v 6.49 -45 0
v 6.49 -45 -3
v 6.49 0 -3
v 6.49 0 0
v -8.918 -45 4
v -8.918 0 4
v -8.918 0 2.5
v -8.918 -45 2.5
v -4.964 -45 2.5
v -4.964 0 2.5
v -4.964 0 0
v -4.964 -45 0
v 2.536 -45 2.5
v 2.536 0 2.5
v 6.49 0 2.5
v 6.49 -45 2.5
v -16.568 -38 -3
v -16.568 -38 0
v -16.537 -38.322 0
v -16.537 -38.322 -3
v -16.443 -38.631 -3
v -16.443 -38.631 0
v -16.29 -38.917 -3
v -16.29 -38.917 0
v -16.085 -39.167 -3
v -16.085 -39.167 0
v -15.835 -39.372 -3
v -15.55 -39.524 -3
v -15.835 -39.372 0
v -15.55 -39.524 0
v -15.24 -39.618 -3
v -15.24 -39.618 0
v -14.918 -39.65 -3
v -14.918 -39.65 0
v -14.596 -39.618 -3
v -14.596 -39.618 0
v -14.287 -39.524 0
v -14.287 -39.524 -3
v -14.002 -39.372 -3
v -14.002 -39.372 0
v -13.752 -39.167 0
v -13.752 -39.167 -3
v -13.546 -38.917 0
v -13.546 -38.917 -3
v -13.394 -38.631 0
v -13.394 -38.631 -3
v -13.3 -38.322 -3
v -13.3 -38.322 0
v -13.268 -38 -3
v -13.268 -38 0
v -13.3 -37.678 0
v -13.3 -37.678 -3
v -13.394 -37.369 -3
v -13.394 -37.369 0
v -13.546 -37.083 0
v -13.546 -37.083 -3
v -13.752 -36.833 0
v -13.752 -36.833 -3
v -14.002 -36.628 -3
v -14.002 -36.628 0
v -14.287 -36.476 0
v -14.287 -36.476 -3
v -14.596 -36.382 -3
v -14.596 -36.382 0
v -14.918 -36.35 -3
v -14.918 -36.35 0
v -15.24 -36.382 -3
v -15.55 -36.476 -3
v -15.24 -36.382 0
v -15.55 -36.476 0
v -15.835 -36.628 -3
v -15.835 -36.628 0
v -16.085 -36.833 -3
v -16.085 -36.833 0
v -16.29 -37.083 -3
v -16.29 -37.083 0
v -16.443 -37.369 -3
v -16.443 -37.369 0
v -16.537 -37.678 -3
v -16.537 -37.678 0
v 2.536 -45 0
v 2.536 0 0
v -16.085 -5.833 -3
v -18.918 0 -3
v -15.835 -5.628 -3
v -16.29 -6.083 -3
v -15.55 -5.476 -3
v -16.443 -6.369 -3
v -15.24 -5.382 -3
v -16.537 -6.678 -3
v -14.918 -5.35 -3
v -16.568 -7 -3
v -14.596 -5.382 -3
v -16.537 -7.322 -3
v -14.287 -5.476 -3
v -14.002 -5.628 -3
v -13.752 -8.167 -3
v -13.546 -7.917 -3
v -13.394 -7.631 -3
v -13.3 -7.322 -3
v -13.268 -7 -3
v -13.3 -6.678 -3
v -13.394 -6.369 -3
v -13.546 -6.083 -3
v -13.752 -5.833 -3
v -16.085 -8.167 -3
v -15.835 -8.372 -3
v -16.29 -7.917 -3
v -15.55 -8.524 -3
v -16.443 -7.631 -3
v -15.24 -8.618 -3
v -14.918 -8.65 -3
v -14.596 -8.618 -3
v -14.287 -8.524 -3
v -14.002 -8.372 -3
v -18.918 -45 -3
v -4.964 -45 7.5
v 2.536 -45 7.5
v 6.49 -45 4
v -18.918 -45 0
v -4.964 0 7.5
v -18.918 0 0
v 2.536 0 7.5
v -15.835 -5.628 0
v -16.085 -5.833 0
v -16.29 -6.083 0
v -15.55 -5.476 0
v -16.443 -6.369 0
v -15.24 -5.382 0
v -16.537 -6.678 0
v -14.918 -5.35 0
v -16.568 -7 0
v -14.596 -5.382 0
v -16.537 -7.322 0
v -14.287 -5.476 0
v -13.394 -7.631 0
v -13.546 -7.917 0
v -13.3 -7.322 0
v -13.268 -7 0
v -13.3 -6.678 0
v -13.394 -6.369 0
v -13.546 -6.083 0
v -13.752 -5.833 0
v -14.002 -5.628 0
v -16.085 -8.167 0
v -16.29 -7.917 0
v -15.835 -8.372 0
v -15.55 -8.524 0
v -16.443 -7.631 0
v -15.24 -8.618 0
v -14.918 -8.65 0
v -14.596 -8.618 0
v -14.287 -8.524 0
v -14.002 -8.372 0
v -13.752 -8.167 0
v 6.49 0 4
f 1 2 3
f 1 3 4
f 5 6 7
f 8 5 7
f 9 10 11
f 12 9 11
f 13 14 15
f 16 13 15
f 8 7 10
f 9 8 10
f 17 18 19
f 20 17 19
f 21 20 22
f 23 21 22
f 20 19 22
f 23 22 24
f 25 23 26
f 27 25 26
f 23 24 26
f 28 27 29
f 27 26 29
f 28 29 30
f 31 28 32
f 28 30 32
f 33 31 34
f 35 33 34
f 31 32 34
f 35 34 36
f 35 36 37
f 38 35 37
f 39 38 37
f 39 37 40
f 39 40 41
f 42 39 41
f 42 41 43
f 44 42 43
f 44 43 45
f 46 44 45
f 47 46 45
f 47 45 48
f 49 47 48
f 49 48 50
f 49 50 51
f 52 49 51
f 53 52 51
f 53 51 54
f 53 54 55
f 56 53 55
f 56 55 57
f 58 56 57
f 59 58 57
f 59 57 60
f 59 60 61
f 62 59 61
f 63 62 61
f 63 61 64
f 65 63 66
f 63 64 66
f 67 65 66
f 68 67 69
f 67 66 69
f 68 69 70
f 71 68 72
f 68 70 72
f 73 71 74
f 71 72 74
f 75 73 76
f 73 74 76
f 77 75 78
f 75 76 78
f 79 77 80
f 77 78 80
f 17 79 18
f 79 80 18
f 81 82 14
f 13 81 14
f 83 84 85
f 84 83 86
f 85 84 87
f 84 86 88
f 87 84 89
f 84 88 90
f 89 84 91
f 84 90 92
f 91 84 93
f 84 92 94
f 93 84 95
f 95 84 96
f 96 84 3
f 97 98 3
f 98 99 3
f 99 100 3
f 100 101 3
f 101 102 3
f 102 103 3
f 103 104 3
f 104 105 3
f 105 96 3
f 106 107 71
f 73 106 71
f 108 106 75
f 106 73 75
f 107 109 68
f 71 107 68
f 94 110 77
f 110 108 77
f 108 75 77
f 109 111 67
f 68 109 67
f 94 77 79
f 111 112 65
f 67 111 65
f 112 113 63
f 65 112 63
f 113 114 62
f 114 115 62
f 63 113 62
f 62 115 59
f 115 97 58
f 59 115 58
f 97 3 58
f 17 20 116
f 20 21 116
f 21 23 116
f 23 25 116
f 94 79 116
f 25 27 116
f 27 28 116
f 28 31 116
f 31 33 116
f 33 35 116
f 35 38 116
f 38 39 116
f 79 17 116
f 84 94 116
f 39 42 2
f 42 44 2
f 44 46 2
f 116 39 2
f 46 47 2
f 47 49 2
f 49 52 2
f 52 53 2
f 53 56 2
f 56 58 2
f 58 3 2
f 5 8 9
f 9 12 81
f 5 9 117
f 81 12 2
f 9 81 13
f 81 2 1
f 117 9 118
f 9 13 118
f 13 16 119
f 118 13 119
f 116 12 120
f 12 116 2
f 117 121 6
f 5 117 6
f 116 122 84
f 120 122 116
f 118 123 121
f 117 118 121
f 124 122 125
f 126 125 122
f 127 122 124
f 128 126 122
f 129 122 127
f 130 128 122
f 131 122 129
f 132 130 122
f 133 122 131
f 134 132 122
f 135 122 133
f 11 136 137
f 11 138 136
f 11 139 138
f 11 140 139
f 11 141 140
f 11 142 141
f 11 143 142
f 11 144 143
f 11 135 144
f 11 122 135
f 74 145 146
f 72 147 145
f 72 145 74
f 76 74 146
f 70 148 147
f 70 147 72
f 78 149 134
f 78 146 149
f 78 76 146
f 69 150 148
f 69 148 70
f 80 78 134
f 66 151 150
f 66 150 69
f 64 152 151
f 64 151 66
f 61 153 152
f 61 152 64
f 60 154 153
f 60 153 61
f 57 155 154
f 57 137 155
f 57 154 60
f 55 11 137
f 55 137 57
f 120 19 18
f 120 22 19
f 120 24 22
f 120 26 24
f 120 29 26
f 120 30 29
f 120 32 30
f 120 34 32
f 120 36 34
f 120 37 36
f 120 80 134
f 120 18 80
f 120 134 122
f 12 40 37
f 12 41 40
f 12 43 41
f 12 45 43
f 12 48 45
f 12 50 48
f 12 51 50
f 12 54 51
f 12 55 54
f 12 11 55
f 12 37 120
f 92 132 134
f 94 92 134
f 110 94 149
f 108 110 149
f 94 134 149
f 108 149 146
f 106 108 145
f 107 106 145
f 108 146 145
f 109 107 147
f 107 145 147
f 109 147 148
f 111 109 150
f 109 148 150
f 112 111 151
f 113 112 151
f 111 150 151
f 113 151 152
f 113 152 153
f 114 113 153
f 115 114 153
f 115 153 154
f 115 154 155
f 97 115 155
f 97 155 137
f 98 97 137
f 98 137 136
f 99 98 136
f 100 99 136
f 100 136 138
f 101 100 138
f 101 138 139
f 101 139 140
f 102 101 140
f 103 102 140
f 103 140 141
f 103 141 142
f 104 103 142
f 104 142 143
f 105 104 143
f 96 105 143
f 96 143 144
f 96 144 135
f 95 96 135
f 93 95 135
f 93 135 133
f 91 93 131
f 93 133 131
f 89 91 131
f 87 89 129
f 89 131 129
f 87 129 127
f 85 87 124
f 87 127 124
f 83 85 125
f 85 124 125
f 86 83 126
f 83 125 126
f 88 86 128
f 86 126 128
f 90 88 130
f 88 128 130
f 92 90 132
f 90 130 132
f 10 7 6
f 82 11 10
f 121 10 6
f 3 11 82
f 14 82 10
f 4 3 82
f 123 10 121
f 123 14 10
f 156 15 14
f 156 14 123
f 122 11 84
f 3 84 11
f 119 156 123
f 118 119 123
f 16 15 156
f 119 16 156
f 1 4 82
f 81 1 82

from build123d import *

# Parameters (mm, degrees)
F1_DEPTH = 45
F2_W     = 45
F2_H     = 3
F3_DEPTH = 10
F5_D     = 3.3


with BuildPart() as f1:
    # F0 (on Front) → F1 (new body)
    with BuildSketch(Plane.XZ):
        Polygon((-4.964183461, 2.5), (-4.964183461, 0), (2.535816539, 0), (2.535816539, 2.5), (6.4899705969, 2.5), (6.4899705969, 4), (2.535816539, 7.5), (-4.964183461, 7.5), (-8.9183375189, 4), (-8.9183375189, 2.5), align=None)
        Polygon((2.535816539, 0), (-4.964183461, 0), (-8.9183375189, 0), (-8.9183375189, -3), (6.4899705969, -3), (6.4899705969, 0), align=None)
    extrude(amount=F1_DEPTH)

    # F2 (on face) → F3 (join)
    with BuildSketch(Plane(origin=(-8.9183375189, 0, 0), x_dir=(0, -1, 0), z_dir=(-1, 0, 0))):
        with Locations((22.5, -1.5)):
            Rectangle(F2_W, F2_H)
    extrude(amount=F3_DEPTH)

    # F5 (through all)
    with Locations(Plane(origin=(0, 0, -3), x_dir=(1, 0, 0), z_dir=(0, 0, -1))):
        with Locations((-14.9183375189, 38), (-14.9183375189, 7)):
            Hole(F5_D / 2)


solid = f1.part
